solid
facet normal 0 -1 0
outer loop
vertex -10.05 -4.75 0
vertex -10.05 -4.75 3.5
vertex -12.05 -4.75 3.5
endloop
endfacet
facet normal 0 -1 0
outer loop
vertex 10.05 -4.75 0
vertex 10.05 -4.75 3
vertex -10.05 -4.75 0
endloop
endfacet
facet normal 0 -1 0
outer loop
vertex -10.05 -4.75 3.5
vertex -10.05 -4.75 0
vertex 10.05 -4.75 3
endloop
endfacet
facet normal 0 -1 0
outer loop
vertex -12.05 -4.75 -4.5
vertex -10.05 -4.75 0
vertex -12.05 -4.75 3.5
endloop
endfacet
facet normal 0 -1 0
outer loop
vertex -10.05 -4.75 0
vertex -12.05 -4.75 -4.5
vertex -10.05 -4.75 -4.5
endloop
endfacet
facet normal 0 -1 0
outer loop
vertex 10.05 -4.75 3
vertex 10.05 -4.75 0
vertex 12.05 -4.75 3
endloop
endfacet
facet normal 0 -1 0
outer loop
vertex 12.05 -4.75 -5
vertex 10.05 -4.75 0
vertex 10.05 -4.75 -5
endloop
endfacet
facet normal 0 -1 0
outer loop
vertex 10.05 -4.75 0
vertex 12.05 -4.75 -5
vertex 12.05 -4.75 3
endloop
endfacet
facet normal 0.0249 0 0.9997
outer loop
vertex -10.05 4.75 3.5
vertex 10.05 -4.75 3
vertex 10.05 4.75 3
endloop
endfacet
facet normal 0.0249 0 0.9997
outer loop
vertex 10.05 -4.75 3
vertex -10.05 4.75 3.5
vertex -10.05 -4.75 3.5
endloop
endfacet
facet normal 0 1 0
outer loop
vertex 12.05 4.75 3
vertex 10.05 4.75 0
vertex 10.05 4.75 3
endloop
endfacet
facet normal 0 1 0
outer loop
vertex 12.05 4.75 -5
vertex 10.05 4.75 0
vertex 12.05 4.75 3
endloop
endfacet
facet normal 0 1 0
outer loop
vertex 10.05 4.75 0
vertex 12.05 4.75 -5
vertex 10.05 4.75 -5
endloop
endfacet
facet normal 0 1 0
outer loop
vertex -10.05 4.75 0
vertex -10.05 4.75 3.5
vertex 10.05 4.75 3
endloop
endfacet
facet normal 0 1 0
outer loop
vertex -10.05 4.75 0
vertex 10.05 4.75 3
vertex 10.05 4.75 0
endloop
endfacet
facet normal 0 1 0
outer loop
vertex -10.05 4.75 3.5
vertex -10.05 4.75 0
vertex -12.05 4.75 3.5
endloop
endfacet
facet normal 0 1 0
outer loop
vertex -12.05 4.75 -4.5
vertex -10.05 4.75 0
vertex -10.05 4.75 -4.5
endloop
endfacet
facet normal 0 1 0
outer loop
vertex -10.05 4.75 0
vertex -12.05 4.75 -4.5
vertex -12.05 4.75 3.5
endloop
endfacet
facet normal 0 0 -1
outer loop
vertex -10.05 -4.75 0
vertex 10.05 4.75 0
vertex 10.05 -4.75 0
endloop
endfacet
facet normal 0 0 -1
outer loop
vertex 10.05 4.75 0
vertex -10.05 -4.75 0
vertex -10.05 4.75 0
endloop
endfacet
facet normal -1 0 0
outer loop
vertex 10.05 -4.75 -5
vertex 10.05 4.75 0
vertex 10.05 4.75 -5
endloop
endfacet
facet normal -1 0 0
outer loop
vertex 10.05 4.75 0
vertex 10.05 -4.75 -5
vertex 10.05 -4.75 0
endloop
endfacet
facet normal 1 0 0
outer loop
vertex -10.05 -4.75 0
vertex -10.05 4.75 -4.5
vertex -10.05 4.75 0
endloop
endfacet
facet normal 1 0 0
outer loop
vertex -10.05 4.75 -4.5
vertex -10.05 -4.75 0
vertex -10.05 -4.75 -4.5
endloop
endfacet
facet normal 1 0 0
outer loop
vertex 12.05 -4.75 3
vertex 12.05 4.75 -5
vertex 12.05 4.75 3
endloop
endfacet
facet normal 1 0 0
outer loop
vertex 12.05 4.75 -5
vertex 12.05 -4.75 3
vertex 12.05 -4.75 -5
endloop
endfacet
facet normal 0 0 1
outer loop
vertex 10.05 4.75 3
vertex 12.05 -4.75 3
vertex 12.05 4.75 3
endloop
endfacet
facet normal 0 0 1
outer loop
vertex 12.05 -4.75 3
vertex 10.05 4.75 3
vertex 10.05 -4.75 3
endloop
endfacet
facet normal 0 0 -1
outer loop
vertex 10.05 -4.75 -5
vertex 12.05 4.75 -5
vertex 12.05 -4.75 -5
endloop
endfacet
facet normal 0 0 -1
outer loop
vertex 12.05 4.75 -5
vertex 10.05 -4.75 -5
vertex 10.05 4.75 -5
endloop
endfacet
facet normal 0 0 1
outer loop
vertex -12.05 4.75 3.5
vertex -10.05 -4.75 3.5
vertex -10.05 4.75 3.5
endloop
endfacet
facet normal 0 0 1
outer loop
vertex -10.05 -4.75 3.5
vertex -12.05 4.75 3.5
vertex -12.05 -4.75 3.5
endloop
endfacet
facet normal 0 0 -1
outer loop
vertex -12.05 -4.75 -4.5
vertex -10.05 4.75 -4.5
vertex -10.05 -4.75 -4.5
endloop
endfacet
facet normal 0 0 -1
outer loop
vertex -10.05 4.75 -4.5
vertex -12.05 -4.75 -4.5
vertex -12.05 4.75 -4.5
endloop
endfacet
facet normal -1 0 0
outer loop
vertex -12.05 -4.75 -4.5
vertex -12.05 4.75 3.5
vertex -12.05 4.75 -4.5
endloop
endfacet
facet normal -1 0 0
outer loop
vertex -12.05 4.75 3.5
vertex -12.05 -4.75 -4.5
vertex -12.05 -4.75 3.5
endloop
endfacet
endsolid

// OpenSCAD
height=20.1;
wedge_z1 = 0;
wedge_z2 = 3.5;
wedge_z3 = 3;
wedge_y = 10-0.5;
foot_z = 8;

module wedge() {
    polyhedron(
        points=[
                [-height/2,-wedge_y/2, wedge_z1],
                [-height/2,-wedge_y/2, wedge_z2],
                [height/2,-wedge_y/2, wedge_z3],
                [height/2,-wedge_y/2, wedge_z1],
                [-height/2,wedge_y/2, wedge_z1],
                [-height/2,wedge_y/2, wedge_z2],
                [height/2,wedge_y/2, wedge_z3],
                [height/2,wedge_y/2, wedge_z1],
              ],
        faces =[
                [0,3,2,1],
                [1,2,6,5],
                [5,6,7,4],
                [4,7,3,0],
                [6,2,3,7],
                [0,1,5,4],
            
    ]);
}

wedge();
translate([height/2, -wedge_y/2, -foot_z + wedge_z3]) cube([2, wedge_y, foot_z]);
translate([-height/2-2, -wedge_y/2, -foot_z + wedge_z2]) cube([2, wedge_y, foot_z]);
